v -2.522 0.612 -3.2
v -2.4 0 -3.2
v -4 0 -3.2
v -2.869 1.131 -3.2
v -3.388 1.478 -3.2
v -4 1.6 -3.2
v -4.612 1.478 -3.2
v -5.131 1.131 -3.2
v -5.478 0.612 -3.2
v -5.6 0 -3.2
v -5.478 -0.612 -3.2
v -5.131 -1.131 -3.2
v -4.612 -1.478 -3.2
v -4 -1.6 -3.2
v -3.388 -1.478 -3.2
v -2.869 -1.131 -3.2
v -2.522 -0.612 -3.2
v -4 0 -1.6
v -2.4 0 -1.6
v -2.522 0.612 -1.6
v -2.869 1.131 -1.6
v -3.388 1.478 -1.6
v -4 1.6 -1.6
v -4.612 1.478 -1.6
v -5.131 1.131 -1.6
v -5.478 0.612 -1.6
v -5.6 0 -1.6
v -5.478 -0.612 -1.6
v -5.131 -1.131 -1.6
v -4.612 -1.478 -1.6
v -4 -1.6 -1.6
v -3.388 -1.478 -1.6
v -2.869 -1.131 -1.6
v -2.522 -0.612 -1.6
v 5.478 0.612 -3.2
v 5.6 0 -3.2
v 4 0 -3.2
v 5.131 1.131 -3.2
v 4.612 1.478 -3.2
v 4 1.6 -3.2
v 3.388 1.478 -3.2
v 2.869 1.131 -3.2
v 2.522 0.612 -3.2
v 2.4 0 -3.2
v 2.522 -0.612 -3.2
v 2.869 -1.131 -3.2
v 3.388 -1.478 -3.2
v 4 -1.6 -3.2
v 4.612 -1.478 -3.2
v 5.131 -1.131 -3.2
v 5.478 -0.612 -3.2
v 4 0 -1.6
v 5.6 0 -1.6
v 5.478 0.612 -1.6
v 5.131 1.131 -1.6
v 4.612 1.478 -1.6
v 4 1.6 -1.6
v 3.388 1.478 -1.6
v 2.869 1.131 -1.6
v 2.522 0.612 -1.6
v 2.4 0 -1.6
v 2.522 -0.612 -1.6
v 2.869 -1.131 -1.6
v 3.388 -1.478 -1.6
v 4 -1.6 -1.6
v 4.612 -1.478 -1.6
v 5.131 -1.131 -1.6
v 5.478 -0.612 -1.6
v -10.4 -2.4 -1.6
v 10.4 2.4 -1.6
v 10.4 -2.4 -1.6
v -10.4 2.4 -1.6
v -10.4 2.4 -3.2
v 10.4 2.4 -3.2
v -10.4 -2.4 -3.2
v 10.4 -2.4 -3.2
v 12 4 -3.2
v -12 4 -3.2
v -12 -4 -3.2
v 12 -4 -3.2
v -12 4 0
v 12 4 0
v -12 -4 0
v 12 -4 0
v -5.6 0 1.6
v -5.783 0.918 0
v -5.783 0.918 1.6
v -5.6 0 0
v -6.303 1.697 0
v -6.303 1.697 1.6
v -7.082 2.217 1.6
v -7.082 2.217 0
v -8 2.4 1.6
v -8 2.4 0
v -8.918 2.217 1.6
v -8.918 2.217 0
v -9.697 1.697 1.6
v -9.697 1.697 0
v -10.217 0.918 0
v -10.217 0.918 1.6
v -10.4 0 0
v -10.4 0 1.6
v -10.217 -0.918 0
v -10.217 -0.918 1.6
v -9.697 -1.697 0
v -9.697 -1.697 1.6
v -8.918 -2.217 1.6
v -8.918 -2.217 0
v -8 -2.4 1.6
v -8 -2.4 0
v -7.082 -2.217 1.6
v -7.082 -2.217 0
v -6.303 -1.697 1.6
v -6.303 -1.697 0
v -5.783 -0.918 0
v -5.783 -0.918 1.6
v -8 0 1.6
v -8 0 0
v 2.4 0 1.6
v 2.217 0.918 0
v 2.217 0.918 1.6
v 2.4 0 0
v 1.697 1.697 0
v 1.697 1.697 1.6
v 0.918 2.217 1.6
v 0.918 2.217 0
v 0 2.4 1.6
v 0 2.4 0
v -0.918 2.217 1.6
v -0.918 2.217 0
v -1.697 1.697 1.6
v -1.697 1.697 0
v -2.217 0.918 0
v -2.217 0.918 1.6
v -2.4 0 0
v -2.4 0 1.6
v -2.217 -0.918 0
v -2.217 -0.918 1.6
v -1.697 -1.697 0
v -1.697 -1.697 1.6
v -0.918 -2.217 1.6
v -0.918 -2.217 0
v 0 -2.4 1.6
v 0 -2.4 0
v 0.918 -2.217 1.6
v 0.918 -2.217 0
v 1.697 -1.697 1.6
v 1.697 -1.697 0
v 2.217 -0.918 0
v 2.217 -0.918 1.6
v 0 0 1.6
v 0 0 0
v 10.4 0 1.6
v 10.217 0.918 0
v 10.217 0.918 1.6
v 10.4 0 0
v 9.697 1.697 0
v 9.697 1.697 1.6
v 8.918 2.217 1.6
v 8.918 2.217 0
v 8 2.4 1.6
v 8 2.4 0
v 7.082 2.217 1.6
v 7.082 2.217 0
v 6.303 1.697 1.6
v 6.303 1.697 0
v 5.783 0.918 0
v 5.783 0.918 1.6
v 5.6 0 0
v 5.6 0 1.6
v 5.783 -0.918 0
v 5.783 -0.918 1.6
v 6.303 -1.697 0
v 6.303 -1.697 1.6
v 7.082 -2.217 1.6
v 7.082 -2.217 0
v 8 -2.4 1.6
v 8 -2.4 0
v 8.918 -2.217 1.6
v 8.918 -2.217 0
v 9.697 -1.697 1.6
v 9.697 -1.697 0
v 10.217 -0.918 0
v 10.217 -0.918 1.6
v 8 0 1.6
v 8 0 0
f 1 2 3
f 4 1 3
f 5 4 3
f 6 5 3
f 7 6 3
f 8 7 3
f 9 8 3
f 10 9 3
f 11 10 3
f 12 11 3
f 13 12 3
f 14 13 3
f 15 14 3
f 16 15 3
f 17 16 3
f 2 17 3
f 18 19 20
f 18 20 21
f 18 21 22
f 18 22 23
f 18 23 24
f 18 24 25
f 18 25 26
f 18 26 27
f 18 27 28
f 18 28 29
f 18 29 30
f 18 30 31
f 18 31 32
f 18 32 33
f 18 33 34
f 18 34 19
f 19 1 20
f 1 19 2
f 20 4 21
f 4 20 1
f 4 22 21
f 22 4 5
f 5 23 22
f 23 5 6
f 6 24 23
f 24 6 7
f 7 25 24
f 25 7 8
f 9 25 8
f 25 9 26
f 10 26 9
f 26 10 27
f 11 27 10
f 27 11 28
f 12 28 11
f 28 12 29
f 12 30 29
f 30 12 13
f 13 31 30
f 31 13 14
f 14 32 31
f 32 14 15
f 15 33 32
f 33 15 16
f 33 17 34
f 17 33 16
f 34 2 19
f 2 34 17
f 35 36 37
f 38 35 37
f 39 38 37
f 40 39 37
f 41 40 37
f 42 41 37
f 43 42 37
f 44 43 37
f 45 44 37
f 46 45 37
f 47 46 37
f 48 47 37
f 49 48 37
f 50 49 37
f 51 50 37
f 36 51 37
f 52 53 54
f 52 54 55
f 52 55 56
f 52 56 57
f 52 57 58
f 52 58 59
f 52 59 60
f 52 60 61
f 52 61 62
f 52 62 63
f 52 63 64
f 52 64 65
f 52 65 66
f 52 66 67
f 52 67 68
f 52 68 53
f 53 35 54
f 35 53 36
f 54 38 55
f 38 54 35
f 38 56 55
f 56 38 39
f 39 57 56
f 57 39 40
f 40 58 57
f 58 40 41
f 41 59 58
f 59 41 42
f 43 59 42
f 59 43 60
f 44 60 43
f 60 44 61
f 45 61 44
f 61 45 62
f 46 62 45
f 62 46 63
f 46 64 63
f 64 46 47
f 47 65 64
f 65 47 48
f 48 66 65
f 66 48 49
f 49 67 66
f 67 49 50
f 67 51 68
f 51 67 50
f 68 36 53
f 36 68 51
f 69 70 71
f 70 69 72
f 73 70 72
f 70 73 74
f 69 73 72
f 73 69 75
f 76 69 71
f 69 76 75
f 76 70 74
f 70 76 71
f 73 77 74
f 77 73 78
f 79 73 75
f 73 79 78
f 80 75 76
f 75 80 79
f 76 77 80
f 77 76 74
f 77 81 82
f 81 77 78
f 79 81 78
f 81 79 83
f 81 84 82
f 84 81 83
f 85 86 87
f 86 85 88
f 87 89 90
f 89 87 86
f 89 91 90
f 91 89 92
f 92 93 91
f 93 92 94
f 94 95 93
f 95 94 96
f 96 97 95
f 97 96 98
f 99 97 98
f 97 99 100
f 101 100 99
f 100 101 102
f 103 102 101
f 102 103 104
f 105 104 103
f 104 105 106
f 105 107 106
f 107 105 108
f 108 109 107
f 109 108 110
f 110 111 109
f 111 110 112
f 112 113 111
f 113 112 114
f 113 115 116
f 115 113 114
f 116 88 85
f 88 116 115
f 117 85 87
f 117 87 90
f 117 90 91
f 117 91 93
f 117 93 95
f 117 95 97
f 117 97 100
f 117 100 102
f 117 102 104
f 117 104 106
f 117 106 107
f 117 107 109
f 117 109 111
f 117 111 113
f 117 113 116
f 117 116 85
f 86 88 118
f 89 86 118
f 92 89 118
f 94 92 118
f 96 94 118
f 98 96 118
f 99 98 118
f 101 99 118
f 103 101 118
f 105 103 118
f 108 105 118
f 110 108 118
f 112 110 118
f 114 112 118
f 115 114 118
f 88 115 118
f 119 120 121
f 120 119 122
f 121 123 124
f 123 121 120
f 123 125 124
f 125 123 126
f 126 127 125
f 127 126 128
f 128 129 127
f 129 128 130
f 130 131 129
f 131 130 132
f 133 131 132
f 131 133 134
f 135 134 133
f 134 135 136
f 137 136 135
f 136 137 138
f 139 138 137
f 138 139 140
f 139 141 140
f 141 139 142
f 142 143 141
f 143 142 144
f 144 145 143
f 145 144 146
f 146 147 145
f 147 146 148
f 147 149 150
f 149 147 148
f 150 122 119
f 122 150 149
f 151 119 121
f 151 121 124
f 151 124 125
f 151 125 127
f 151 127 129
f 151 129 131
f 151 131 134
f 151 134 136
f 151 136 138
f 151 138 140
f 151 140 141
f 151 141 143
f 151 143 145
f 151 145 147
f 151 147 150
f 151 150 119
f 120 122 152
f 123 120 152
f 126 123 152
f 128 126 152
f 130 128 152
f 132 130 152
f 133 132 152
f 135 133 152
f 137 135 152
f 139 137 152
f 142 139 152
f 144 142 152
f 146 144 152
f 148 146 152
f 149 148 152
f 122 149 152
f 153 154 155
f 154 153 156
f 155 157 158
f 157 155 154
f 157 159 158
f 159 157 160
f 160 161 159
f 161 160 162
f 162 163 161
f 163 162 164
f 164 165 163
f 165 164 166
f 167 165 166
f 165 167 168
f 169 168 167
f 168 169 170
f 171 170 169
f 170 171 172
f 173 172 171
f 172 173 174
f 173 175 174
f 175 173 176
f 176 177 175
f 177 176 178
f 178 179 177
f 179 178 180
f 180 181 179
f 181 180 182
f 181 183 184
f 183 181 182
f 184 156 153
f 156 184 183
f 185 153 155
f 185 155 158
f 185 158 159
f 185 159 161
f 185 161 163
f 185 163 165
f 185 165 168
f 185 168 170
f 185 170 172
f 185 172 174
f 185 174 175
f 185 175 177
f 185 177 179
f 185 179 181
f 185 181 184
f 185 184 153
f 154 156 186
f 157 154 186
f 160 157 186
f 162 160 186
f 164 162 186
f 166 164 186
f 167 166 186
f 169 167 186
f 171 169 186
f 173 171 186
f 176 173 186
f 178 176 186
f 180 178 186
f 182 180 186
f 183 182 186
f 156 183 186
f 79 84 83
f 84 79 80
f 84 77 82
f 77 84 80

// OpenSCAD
// file: ../p/4-4edge.scad
use <../lib.scad>
function ldraw_lib__4_4edge() = [
// 0 Circle 1.0
// 0 Name: 4-4edge.dat
// 0 Author: James Jessiman
// 0 !LDRAW_ORG Primitive UPDATE 2017-01
// 0 !LICENSE Licensed under CC BY 2.0 and CC BY 4.0 : see CAreadme.txt
// 
// 0 BFC CERTIFY CCW
  [0,"BFC","CERTIFY"],
  [0,"BFC","CCW"],
// 
// 0 !HISTORY 1998-12-15 [PTadmin] Official Update 1998-10
// 0 !HISTORY 2005-12-28 [PTadmin] Official Update 2005-01
// 0 !HISTORY 2007-06-24 [PTadmin] Header formatted for Contributor Agreement
// 0 !HISTORY 2008-07-01 [PTadmin] Official Update 2008-01
// 0 !HISTORY 2017-01-15 [Steffen] BFCed
// 0 !HISTORY 2017-12-30 [PTadmin] Official Update 2017-01
// 
// 
// 2 24 1 0 0 0.9239 0 0.3827
  [2,24,1,0,0,0.9239,0,0.3827],
// 2 24 0.9239 0 0.3827 0.7071 0 0.7071
  [2,24,0.9239,0,0.3827,0.7071,0,0.7071],
// 2 24 0.7071 0 0.7071 0.3827 0 0.9239
  [2,24,0.7071,0,0.7071,0.3827,0,0.9239],
// 2 24 0.3827 0 0.9239 0 0 1
  [2,24,0.3827,0,0.9239,0,0,1],
// 2 24 0 0 1 -0.3827 0 0.9239
  [2,24,0,0,1,-0.3827,0,0.9239],
// 2 24 -0.3827 0 0.9239 -0.7071 0 0.7071
  [2,24,-0.3827,0,0.9239,-0.7071,0,0.7071],
// 2 24 -0.7071 0 0.7071 -0.9239 0 0.3827
  [2,24,-0.7071,0,0.7071,-0.9239,0,0.3827],
// 2 24 -0.9239 0 0.3827 -1 0 -0
  [2,24,-0.9239,0,0.3827,-1,0,-0],
// 2 24 -1 0 -0 -0.9239 0 -0.3827
  [2,24,-1,0,-0,-0.9239,0,-0.3827],
// 2 24 -0.9239 0 -0.3827 -0.7071 0 -0.7071
  [2,24,-0.9239,0,-0.3827,-0.7071,0,-0.7071],
// 2 24 -0.7071 0 -0.7071 -0.3827 0 -0.9239
  [2,24,-0.7071,0,-0.7071,-0.3827,0,-0.9239],
// 2 24 -0.3827 0 -0.9239 0 0 -1
  [2,24,-0.3827,0,-0.9239,0,0,-1],
// 2 24 0 0 -1 0.3827 0 -0.9239
  [2,24,0,0,-1,0.3827,0,-0.9239],
// 2 24 0.3827 0 -0.9239 0.7071 0 -0.7071
  [2,24,0.3827,0,-0.9239,0.7071,0,-0.7071],
// 2 24 0.7071 0 -0.7071 0.9239 0 -0.3827
  [2,24,0.7071,0,-0.7071,0.9239,0,-0.3827],
// 2 24 0.9239 0 -0.3827 1 0 0
  [2,24,0.9239,0,-0.3827,1,0,0],
];
module ldraw_lib__4_4edge(step=0, col=false, unit=2/5, alt=false, line=0.2, solid=!$preview)
    makepoly(ldraw_lib__4_4edge(), step=step, col=col, unit=unit, alt=alt, line=line, solid=solid);
ldraw_lib__4_4edge(line=0.2);
// file: ../p/4-4disc.scad
use <../lib.scad>
function ldraw_lib__4_4disc() = [
// 0 Disc 1.0
// 0 Name: 4-4disc.dat
// 0 Author: James Jessiman
// 0 !LDRAW_ORG Primitive UPDATE 2002-02
// 0 !LICENSE Licensed under CC BY 2.0 and CC BY 4.0 : see CAreadme.txt
// 
// 0 BFC CERTIFY CCW
  [0,"BFC","CERTIFY"],
  [0,"BFC","CCW"],
// 
// 0 !HISTORY 1998-12-15 [PTadmin] Official Update 1998-10
// 0 !HISTORY 2002-03-23 [sbliss] Added BFC statement
// 0 !HISTORY 2002-04-25 [PTadmin] Official Update 2002-02
// 0 !HISTORY 2007-06-24 [PTadmin] Header formatted for Contributor Agreement
// 0 !HISTORY 2008-07-01 [PTadmin] Official Update 2008-01
// 
// 
// 3 16 0 0 0 1 0 0 0.9239 0 0.3827
  [3,16,0,0,0,1,0,0,0.9239,0,0.3827],
// 3 16 0 0 0 0.9239 0 0.3827 0.7071 0 0.7071
  [3,16,0,0,0,0.9239,0,0.3827,0.7071,0,0.7071],
// 3 16 0 0 0 0.7071 0 0.7071 0.3827 0 0.9239
  [3,16,0,0,0,0.7071,0,0.7071,0.3827,0,0.9239],
// 3 16 0 0 0 0.3827 0 0.9239 0 0 1
  [3,16,0,0,0,0.3827,0,0.9239,0,0,1],
// 3 16 0 0 0 0 0 1 -0.3827 0 0.9239
  [3,16,0,0,0,0,0,1,-0.3827,0,0.9239],
// 3 16 0 0 0 -0.3827 0 0.9239 -0.7071 0 0.7071
  [3,16,0,0,0,-0.3827,0,0.9239,-0.7071,0,0.7071],
// 3 16 0 0 0 -0.7071 0 0.7071 -0.9239 0 0.3827
  [3,16,0,0,0,-0.7071,0,0.7071,-0.9239,0,0.3827],
// 3 16 0 0 0 -0.9239 0 0.3827 -1 0 -0
  [3,16,0,0,0,-0.9239,0,0.3827,-1,0,-0],
// 3 16 0 0 0 -1 0 -0 -0.9239 0 -0.3827
  [3,16,0,0,0,-1,0,-0,-0.9239,0,-0.3827],
// 3 16 0 0 0 -0.9239 0 -0.3827 -0.7071 0 -0.7071
  [3,16,0,0,0,-0.9239,0,-0.3827,-0.7071,0,-0.7071],
// 3 16 0 0 0 -0.7071 0 -0.7071 -0.3827 0 -0.9239
  [3,16,0,0,0,-0.7071,0,-0.7071,-0.3827,0,-0.9239],
// 3 16 0 0 0 -0.3827 0 -0.9239 0 0 -1
  [3,16,0,0,0,-0.3827,0,-0.9239,0,0,-1],
// 3 16 0 0 0 0 0 -1 0.3827 0 -0.9239
  [3,16,0,0,0,0,0,-1,0.3827,0,-0.9239],
// 3 16 0 0 0 0.3827 0 -0.9239 0.7071 0 -0.7071
  [3,16,0,0,0,0.3827,0,-0.9239,0.7071,0,-0.7071],
// 3 16 0 0 0 0.7071 0 -0.7071 0.9239 0 -0.3827
  [3,16,0,0,0,0.7071,0,-0.7071,0.9239,0,-0.3827],
// 3 16 0 0 0 0.9239 0 -0.3827 1 0 0
  [3,16,0,0,0,0.9239,0,-0.3827,1,0,0],
// 0
];
module ldraw_lib__4_4disc(step=0, col=false, unit=2/5, alt=false, line=0.2, solid=!$preview)
    makepoly(ldraw_lib__4_4disc(), step=step, col=col, unit=unit, alt=alt, line=line, solid=solid);
ldraw_lib__4_4disc(line=0.2);
// file: ../p/4-4cyli.scad
use <../lib.scad>
$fa=1; $fs=0.2;
function ldraw_lib__4_4cyli(realsolid=false) = [
// 0 Cylinder 1.0
// 0 Name: 4-4cyli.dat
// 0 Author: James Jessiman
// 0 !LDRAW_ORG Primitive UPDATE 2005-01
// 0 !LICENSE Licensed under CC BY 2.0 and CC BY 4.0 : see CAreadme.txt
// 
// 0 BFC CERTIFY CCW
  [0,"BFC","CERTIFY"],
  [0,"BFC","CCW"],
// 
// 0 !HISTORY 1998-12-15 [PTadmin] Official Update 1998-10
// 0 !HISTORY 2002-03-23 [sbliss] Added BFC statement; merged headers from files in distributions LDraw 0.27 and Complete.
// 0 !HISTORY 2002-04-25 [PTadmin] Official Update 2002-02
// 0 !HISTORY 2004-12-14 [guyvivan] BFC CCW
// 0 !HISTORY 2005-12-28 [PTadmin] Official Update 2005-01
// 0 !HISTORY 2007-06-24 [PTadmin] Header formatted for Contributor Agreement
// 0 !HISTORY 2008-07-01 [PTadmin] Official Update 2008-01
// 
// 
// 4 16 1 1 0 0.9239 1 0.3827 0.9239 0 0.3827 1 0 0
  [4,16,1,1,0,0.9239,1,0.3827,0.9239,0,0.3827,1,0,0],
// 5 24 1 0 0 1 1 0 0.9239 0 0.3827 0.9239 0 -0.3827
  [5,24,1,0,0,1,1,0,0.9239,0,0.3827,0.9239,0,-0.3827],
// 4 16 0.9239 1 0.3827 0.7071 1 0.7071 0.7071 0 0.7071 0.9239 0 0.3827
  [4,16,0.9239,1,0.3827,0.7071,1,0.7071,0.7071,0,0.7071,0.9239,0,0.3827],
// 5 24 0.9239 0 0.3827 0.9239 1 0.3827 0.7071 0 0.7071 1 0 0
  [5,24,0.9239,0,0.3827,0.9239,1,0.3827,0.7071,0,0.7071,1,0,0],
// 4 16 0.7071 1 0.7071 0.3827 1 0.9239 0.3827 0 0.9239 0.7071 0 0.7071
  [4,16,0.7071,1,0.7071,0.3827,1,0.9239,0.3827,0,0.9239,0.7071,0,0.7071],
// 5 24 0.7071 0 0.7071 0.7071 1 0.7071 0.3827 0 0.9239 0.9239 0 0.3827
  [5,24,0.7071,0,0.7071,0.7071,1,0.7071,0.3827,0,0.9239,0.9239,0,0.3827],
// 4 16 0.3827 1 0.9239 0 1 1 0 0 1 0.3827 0 0.9239
  [4,16,0.3827,1,0.9239,0,1,1,0,0,1,0.3827,0,0.9239],
// 5 24 0.3827 0 0.9239 0.3827 1 0.9239 0 0 1 0.7071 0 0.7071
  [5,24,0.3827,0,0.9239,0.3827,1,0.9239,0,0,1,0.7071,0,0.7071],
// 4 16 0 1 1 -0.3827 1 0.9239 -0.3827 0 0.9239 0 0 1
  [4,16,0,1,1,-0.3827,1,0.9239,-0.3827,0,0.9239,0,0,1],
// 5 24 0 0 1 0 1 1 -0.3827 0 0.9239 0.3827 0 0.9239
  [5,24,0,0,1,0,1,1,-0.3827,0,0.9239,0.3827,0,0.9239],
// 4 16 -0.3827 1 0.9239 -0.7071 1 0.7071 -0.7071 0 0.7071 -0.3827 0 0.9239
  [4,16,-0.3827,1,0.9239,-0.7071,1,0.7071,-0.7071,0,0.7071,-0.3827,0,0.9239],
// 5 24 -0.3827 0 0.9239 -0.3827 1 0.9239 -0.7071 0 0.7071 0 0 1
  [5,24,-0.3827,0,0.9239,-0.3827,1,0.9239,-0.7071,0,0.7071,0,0,1],
// 4 16 -0.7071 1 0.7071 -0.9239 1 0.3827 -0.9239 0 0.3827 -0.7071 0 0.7071
  [4,16,-0.7071,1,0.7071,-0.9239,1,0.3827,-0.9239,0,0.3827,-0.7071,0,0.7071],
// 5 24 -0.7071 0 0.7071 -0.7071 1 0.7071 -0.9239 0 0.3827 -0.3827 0 0.9239
  [5,24,-0.7071,0,0.7071,-0.7071,1,0.7071,-0.9239,0,0.3827,-0.3827,0,0.9239],
// 4 16 -0.9239 1 0.3827 -1 1 0 -1 0 0 -0.9239 0 0.3827
  [4,16,-0.9239,1,0.3827,-1,1,0,-1,0,0,-0.9239,0,0.3827],
// 5 24 -0.9239 0 0.3827 -0.9239 1 0.3827 -1 0 0 -0.7071 0 0.7071
  [5,24,-0.9239,0,0.3827,-0.9239,1,0.3827,-1,0,0,-0.7071,0,0.7071],
// 4 16 -1 1 0 -0.9239 1 -0.3827 -0.9239 0 -0.3827 -1 0 0
  [4,16,-1,1,0,-0.9239,1,-0.3827,-0.9239,0,-0.3827,-1,0,0],
// 5 24 -1 0 0 -1 1 0 -0.9239 0 -0.3827 -0.9239 0 0.3827
  [5,24,-1,0,0,-1,1,0,-0.9239,0,-0.3827,-0.9239,0,0.3827],
// 4 16 -0.9239 1 -0.3827 -0.7071 1 -0.7071 -0.7071 0 -0.7071 -0.9239 0 -0.3827
  [4,16,-0.9239,1,-0.3827,-0.7071,1,-0.7071,-0.7071,0,-0.7071,-0.9239,0,-0.3827],
// 5 24 -0.9239 0 -0.3827 -0.9239 1 -0.3827 -0.7071 0 -0.7071 -1 0 0
  [5,24,-0.9239,0,-0.3827,-0.9239,1,-0.3827,-0.7071,0,-0.7071,-1,0,0],
// 4 16 -0.7071 1 -0.7071 -0.3827 1 -0.9239 -0.3827 0 -0.9239 -0.7071 0 -0.7071
  [4,16,-0.7071,1,-0.7071,-0.3827,1,-0.9239,-0.3827,0,-0.9239,-0.7071,0,-0.7071],
// 5 24 -0.7071 0 -0.7071 -0.7071 1 -0.7071 -0.3827 0 -0.9239 -0.9239 0 -0.3827
  [5,24,-0.7071,0,-0.7071,-0.7071,1,-0.7071,-0.3827,0,-0.9239,-0.9239,0,-0.3827],
// 4 16 -0.3827 1 -0.9239 0 1 -1 0 0 -1 -0.3827 0 -0.9239
  [4,16,-0.3827,1,-0.9239,0,1,-1,0,0,-1,-0.3827,0,-0.9239],
// 5 24 -0.3827 0 -0.9239 -0.3827 1 -0.9239 0 0 -1 -0.7071 0 -0.7071
  [5,24,-0.3827,0,-0.9239,-0.3827,1,-0.9239,0,0,-1,-0.7071,0,-0.7071],
// 4 16 0 1 -1 0.3827 1 -0.9239 0.3827 0 -0.9239 0 0 -1
  [4,16,0,1,-1,0.3827,1,-0.9239,0.3827,0,-0.9239,0,0,-1],
// 5 24 0 0 -1 0 1 -1 0.3827 0 -0.9239 -0.3827 0 -0.9239
  [5,24,0,0,-1,0,1,-1,0.3827,0,-0.9239,-0.3827,0,-0.9239],
// 4 16 0.3827 1 -0.9239 0.7071 1 -0.7071 0.7071 0 -0.7071 0.3827 0 -0.9239
  [4,16,0.3827,1,-0.9239,0.7071,1,-0.7071,0.7071,0,-0.7071,0.3827,0,-0.9239],
// 5 24 0.3827 0 -0.9239 0.3827 1 -0.9239 0.7071 0 -0.7071 0 0 -1
  [5,24,0.3827,0,-0.9239,0.3827,1,-0.9239,0.7071,0,-0.7071,0,0,-1],
// 4 16 0.7071 1 -0.7071 0.9239 1 -0.3827 0.9239 0 -0.3827 0.7071 0 -0.7071
  [4,16,0.7071,1,-0.7071,0.9239,1,-0.3827,0.9239,0,-0.3827,0.7071,0,-0.7071],
// 5 24 0.7071 0 -0.7071 0.7071 1 -0.7071 0.9239 0 -0.3827 0.3827 0 -0.9239
  [5,24,0.7071,0,-0.7071,0.7071,1,-0.7071,0.9239,0,-0.3827,0.3827,0,-0.9239],
// 4 16 0.9239 1 -0.3827 1 1 0 1 0 0 0.9239 0 -0.3827
  [4,16,0.9239,1,-0.3827,1,1,0,1,0,0,0.9239,0,-0.3827],
// 5 24 0.9239 0 -0.3827 0.9239 1 -0.3827 1 0 0 0.7071 0 -0.7071
  [5,24,0.9239,0,-0.3827,0.9239,1,-0.3827,1,0,0,0.7071,0,-0.7071],
// 0
];
module ldraw_lib__4_4cyli(step=0, col=false, unit=2/5, alt=false, line=0.2, solid=!$preview)
    makepoly(ldraw_lib__4_4cyli(solid), step=step, col=col, unit=unit, alt=alt, line=line, solid=solid);
ldraw_lib__4_4cyli(line=0.2);
// file: ../p/stud3.scad
use <../lib.scad>
use <4-4cyli.scad>
use <4-4disc.scad>
use <4-4edge.scad>
function ldraw_lib__stud3() = [
// 0 Stud Tube Solid
// 0 Name: stud3.dat
// 0 Author: James Jessiman
// 0 !LDRAW_ORG Primitive UPDATE 2012-01
// 0 !LICENSE Licensed under CC BY 4.0 : see CAreadme.txt
// 
// 0 BFC CERTIFY CCW
  [0,"BFC","CERTIFY"],
  [0,"BFC","CCW"],
// 
// 0 !HISTORY 2002-04-04 [sbliss] Modified for BFC compliance
// 0 !HISTORY 2002-04-25 [PTadmin] Official Update 2002-02
// 0 !HISTORY 2007-06-24 [PTadmin] Header formatted for Contributor Agreement
// 0 !HISTORY 2008-07-01 [PTadmin] Official Update 2008-01
// 0 !HISTORY 2012-02-16 [Philo] Changed to CCW
// 0 !HISTORY 2012-03-30 [PTadmin] Official Update 2012-01
// 
// 
// 1 16 0 -4 0 4 0 0 0 1 0 0 0 4 4-4edge.dat
  [1,16,0,-4,0,4,0,0,0,1,0,0,0,4, ldraw_lib__4_4edge()],
// 1 16 0 0 0 4 0 0 0 1 0 0 0 4 4-4edge.dat
  [1,16,0,0,0,4,0,0,0,1,0,0,0,4, ldraw_lib__4_4edge()],
// 1 16 0 -4 0 4 0 0 0 1 0 0 0 4 4-4disc.dat
  [1,16,0,-4,0,4,0,0,0,1,0,0,0,4, ldraw_lib__4_4disc()],
  [-1,16,0,0,0,4,0,0,0,-1,0,0,0,4, ldraw_lib__4_4disc()],
// 1 16 0 -4 0 4 0 0 0 4 0 0 0 4 4-4cyli.dat
  [1,16,0,-4,0,4,0,0,0,4,0,0,0,4, ldraw_lib__4_4cyli()],
];
module ldraw_lib__stud3(step=0, col=false, unit=2/5, alt=false, line=0.2, solid=!$preview)
    makepoly(ldraw_lib__stud3(), step=step, col=col, unit=unit, alt=alt, line=line, solid=solid);
ldraw_lib__stud3(line=0.2);
// file: ../p/stud.scad
use <../lib.scad>
use <4-4cyli.scad>
use <4-4disc.scad>
use <4-4edge.scad>
function ldraw_lib__stud() = [
// 0 Stud
// 0 Name: stud.dat
// 0 Author: James Jessiman
// 0 !LDRAW_ORG Primitive UPDATE 2012-01
// 0 !LICENSE Licensed under CC BY 4.0 : see CAreadme.txt
// 
// 0 BFC CERTIFY CCW
  [0,"BFC","CERTIFY"],
  [0,"BFC","CCW"],
// 
// 0 !HISTORY 2002-04-04 [sbliss] Modified for BFC compliance
// 0 !HISTORY 2002-04-25 [PTadmin] Official Update 2002-02
// 0 !HISTORY 2007-06-24 [PTadmin] Header formatted for Contributor Agreement
// 0 !HISTORY 2008-07-01 [PTadmin] Official Update 2008-01
// 0 !HISTORY 2012-02-16 [Philo] Changed to CCW
// 0 !HISTORY 2012-03-30 [PTadmin] Official Update 2012-01
// 
// 
// 1 16 0 0 0 6 0 0 0 1 0 0 0 6 4-4edge.dat
  [1,16,0,0,0,6,0,0,0,1,0,0,0,6, ldraw_lib__4_4edge()],
// 1 16 0 -4 0 6 0 0 0 1 0 0 0 6 4-4edge.dat
  [1,16,0,-4,0,6,0,0,0,1,0,0,0,6, ldraw_lib__4_4edge()],
// 1 16 0 0 0 6 0 0 0 -4 0 0 0 6 4-4cyli.dat
  [1,16,0,0,0,6,0,0,0,-4,0,0,0,6, ldraw_lib__4_4cyli()],
// 1 16 0 -4 0 6 0 0 0 1 0 0 0 6 4-4disc.dat
  [1,16,0,-4,0,6,0,0,0,1,0,0,0,6, ldraw_lib__4_4disc()],
  [-1,16,0,0,0,6,0,0,0,-1,0,0,0,6, ldraw_lib__4_4disc()],
];
module ldraw_lib__stud(step=0, col=false, unit=2/5, alt=false, line=0.2, solid=!$preview)
    makepoly(ldraw_lib__stud(), step=step, col=col, unit=unit, alt=alt, line=line, solid=solid);
ldraw_lib__stud(line=0.2);
// file: ../p/stug3-1x2.scad
use <../lib.scad>
use <stud3.scad>
function ldraw_lib__stug3_1x2() = [
// 0 Stud Tube Solid Group  1 x  2
// 0 Name: stug3-1x2.dat
// 0 Author: Steffen [Steffen]
// 0 !LDRAW_ORG Primitive UPDATE 2013-02
// 0 !LICENSE Licensed under CC BY 4.0 : see CAreadme.txt
// 
// 0 BFC CERTIFY CCW
  [0,"BFC","CERTIFY"],
  [0,"BFC","CCW"],
// 
// 0 !HISTORY 2013-12-23 [PTadmin] Official Update 2013-02
// 
// 
// 1 16 -10 0 0 1 0 0 0 1 0 0 0 1 stud3.dat
  [1,16,-10,0,0,1,0,0,0,1,0,0,0,1, ldraw_lib__stud3()],
// 1 16 10 0 0 1 0 0 0 1 0 0 0 1 stud3.dat
  [1,16,10,0,0,1,0,0,0,1,0,0,0,1, ldraw_lib__stud3()],
];
module ldraw_lib__stug3_1x2(step=0, col=false, unit=2/5, alt=false, line=0.2, solid=!$preview)
    makepoly(ldraw_lib__stug3_1x2(), step=step, col=col, unit=unit, alt=alt, line=line, solid=solid);
ldraw_lib__stug3_1x2(line=0.2);
// file: ../p/stug-1x3.scad
use <../lib.scad>
use <stud.scad>
$fa=1; $fs=0.2;
function ldraw_lib__stug_1x3(realsolid=false) = [
// 0 Stud Group  1 x  3
// 0 Name: stug-1x3.dat
// 0 Author: Steffen [Steffen]
// 0 !LDRAW_ORG Primitive UPDATE 2012-01
// 0 !LICENSE Licensed under CC BY 2.0 and CC BY 4.0 : see CAreadme.txt
// 
// 0 BFC CERTIFY CCW
  [0,"BFC","CERTIFY"],
  [0,"BFC","CCW"],
// 
// 0 !HISTORY 2012-03-30 [PTadmin] Official Update 2012-01
// 
// 
// 1 16 -20 0 0 1 0 0 0 1 0 0 0 1 stud.dat
  [1,16,-20,0,0,1,0,0,0,1,0,0,0,1, ldraw_lib__stud(realsolid)],
// 1 16 0 0 0 1 0 0 0 1 0 0 0 1 stud.dat
  [1,16,0,0,0,1,0,0,0,1,0,0,0,1, ldraw_lib__stud(realsolid)],
// 1 16 20 0 0 1 0 0 0 1 0 0 0 1 stud.dat
  [1,16,20,0,0,1,0,0,0,1,0,0,0,1, ldraw_lib__stud(realsolid)],
];
module ldraw_lib__stug_1x3(step=0, col=false, unit=2/5, alt=false, line=0.2, solid=!$preview)
    makepoly(ldraw_lib__stug_1x3(solid), step=step, col=col, unit=unit, alt=alt, line=line, solid=solid);
ldraw_lib__stug_1x3(line=0.2);
// file: ../p/recte4.scad
use <../lib.scad>
function ldraw_lib__recte4() = [
// 0 Rectangle Empty with 4 Edges
// 0 Name: recte4.dat
// 0 Author: Steffen [Steffen]
// 0 !LDRAW_ORG Primitive UPDATE 2010-03
// 0 !LICENSE Licensed under CC BY 4.0 : see CAreadme.txt
// 
// 0 BFC CERTIFY CCW
  [0,"BFC","CERTIFY"],
  [0,"BFC","CCW"],
// 
// 0 !HISTORY 2010-12-31 [PTadmin] Official Update 2010-03
// 
// 
// 2 24 1 0 1 -1 0 1
  [2,24,1,0,1,-1,0,1],
// 2 24 -1 0 1 -1 0 -1
  [2,24,-1,0,1,-1,0,-1],
// 2 24 -1 0 -1 1 0 -1
  [2,24,-1,0,-1,1,0,-1],
// 2 24 1 0 -1 1 0 1
  [2,24,1,0,-1,1,0,1],
];
module ldraw_lib__recte4(step=0, col=false, unit=2/5, alt=false, line=0.2, solid=!$preview)
    makepoly(ldraw_lib__recte4(), step=step, col=col, unit=unit, alt=alt, line=line, solid=solid);
ldraw_lib__recte4(line=0.2);
// file: ../p/box5.scad
use <../lib.scad>
function ldraw_lib__box5() = [
// 0 Box with 5 Faces and All Edges
// 0 Name: box5.dat
// 0 Author: James Jessiman
// 0 !LDRAW_ORG Primitive UPDATE 2012-01
// 0 !LICENSE Licensed under CC BY 2.0 and CC BY 4.0 : see CAreadme.txt
// 
// 0 BFC CERTIFY CCW
  [0,"BFC","CERTIFY"],
  [0,"BFC","CCW"],
// 
// 0 !HISTORY 2002-04-03 [sbliss] Modified for BFC compliance
// 0 !HISTORY 2002-04-25 [PTadmin] Official Update 2002-02
// 0 !HISTORY 2007-06-24 [PTadmin] Header formatted for Contributor Agreement
// 0 !HISTORY 2008-07-01 [PTadmin] Official Update 2008-01
// 0 !HISTORY 2012-02-16 [Philo] Changed to CCW
// 0 !HISTORY 2012-03-30 [PTadmin] Official Update 2012-01
// 
// 
// 2 24 1 1 1 -1 1 1
  [2,24,1,1,1,-1,1,1],
// 2 24 -1 1 1 -1 1 -1
  [2,24,-1,1,1,-1,1,-1],
// 2 24 -1 1 -1 1 1 -1
  [2,24,-1,1,-1,1,1,-1],
// 2 24 1 1 -1 1 1 1
  [2,24,1,1,-1,1,1,1],
// 2 24 1 0 1 -1 0 1
  [2,24,1,0,1,-1,0,1],
// 2 24 -1 0 1 -1 0 -1
  [2,24,-1,0,1,-1,0,-1],
// 2 24 -1 0 -1 1 0 -1
  [2,24,-1,0,-1,1,0,-1],
// 2 24 1 0 -1 1 0 1
  [2,24,1,0,-1,1,0,1],
// 2 24 1 0 1 1 1 1
  [2,24,1,0,1,1,1,1],
// 2 24 -1 0 1 -1 1 1
  [2,24,-1,0,1,-1,1,1],
// 2 24 1 0 -1 1 1 -1
  [2,24,1,0,-1,1,1,-1],
// 2 24 -1 0 -1 -1 1 -1
  [2,24,-1,0,-1,-1,1,-1],
// 4 16 -1 1 1 1 1 1 1 1 -1 -1 1 -1
  [4,16,-1,1,1,1,1,1,1,1,-1,-1,1,-1],
// 4 16 -1 1 1 -1 0 1 1 0 1 1 1 1
  [4,16,-1,1,1,-1,0,1,1,0,1,1,1,1],
// 4 16 -1 1 -1 -1 0 -1 -1 0 1 -1 1 1
  [4,16,-1,1,-1,-1,0,-1,-1,0,1,-1,1,1],
// 4 16 1 1 -1 1 0 -1 -1 0 -1 -1 1 -1
  [4,16,1,1,-1,1,0,-1,-1,0,-1,-1,1,-1],
// 4 16 1 1 1 1 0 1 1 0 -1 1 1 -1
  [4,16,1,1,1,1,0,1,1,0,-1,1,1,-1],
];
makepoly(ldraw_lib__box5(), line=0.2);
// file: ../p/box3-5a.scad
use <../lib.scad>
$fa=1; $fs=0.2;
function ldraw_lib__box3_5a(realsolid=false) = [
// 0 Box with 3 Adjacent Faces without 5 Adjacent Edges
// 0 Name: box3-5a.dat
// 0 Author: Philippe Hurbain [Philo]
// 0 !LDRAW_ORG Primitive UPDATE 2013-02
// 0 !LICENSE Licensed under CC BY 2.0 and CC BY 4.0 : see CAreadme.txt
// 
// 0 BFC CERTIFY CCW
  [0,"BFC","CERTIFY"],
  [0,"BFC","CCW"],
// 
// 0 !HISTORY 2013-12-23 [PTadmin] Official Update 2013-02
// 
// 
// 2 24 1 1 1 -1 1 1
  [2,24,1,1,1,-1,1,1],
// 2 24 -1 1 1 -1 1 -1
  [2,24,-1,1,1,-1,1,-1],
// 2 24 1 1 -1 1 1 1
  [2,24,1,1,-1,1,1,1],
// 2 24 1 -1 1 -1 -1 1
  [2,24,1,-1,1,-1,-1,1],
// 2 24 1 -1 -1 1 -1 1
  [2,24,1,-1,-1,1,-1,1],
// 2 24 1 -1 1 1 1 1
  [2,24,1,-1,1,1,1,1],
// 2 24 -1 -1 1 -1 1 1
  [2,24,-1,-1,1,-1,1,1],
// 
// 4 16 1 1 1 1 1 -1 -1 1 -1 -1 1 1
  [4,16,1,1,1,1,1,-1,-1,1,-1,-1,1,1],
// 4 16 1 1 1 1 -1 1 1 -1 -1 1 1 -1
  [4,16,1,1,1,1,-1,1,1,-1,-1,1,1,-1],
// 4 16 1 1 1 -1 1 1 -1 -1 1 1 -1 1
  [4,16,1,1,1,-1,1,1,-1,-1,1,1,-1,1],
];
module ldraw_lib__box3_5a(step=0, col=false, unit=2/5, alt=false, line=0.2, solid=!$preview)
    makepoly(ldraw_lib__box3_5a(solid), step=step, col=col, unit=unit, alt=alt, line=line, solid=solid);
ldraw_lib__box3_5a(line=0.2);
// file: s/3623s02.scad
use <../../lib.scad>
use <../../p/box3-5a.scad>
use <../../p/box5.scad>
use <../../p/recte4.scad>
use <../../p/stug-1x3.scad>
use <../../p/stug3-1x2.scad>
function ldraw_lib__s__3623s02() = [
// 0 ~Plate  1 x  3 without Front  and Side Face
// 0 Name: s\3623s02.dat
// 0 Author: Magnus Forsberg [MagFors]
// 0 !LDRAW_ORG Subpart UPDATE 2024-06
// 0 !LICENSE Licensed under CC BY 4.0 : see CAreadme.txt
// 
// 0 BFC CERTIFY CCW
  [0,"BFC","CERTIFY"],
  [0,"BFC","CCW"],
// 
// 0 !HISTORY 2024-07-29 [OrionP] Official Update 2024-06
// 
// 
// 1 16 0 4 0 1 0 0 0 -1 0 0 0 1 stug3-1x2.dat
  [1,16,0,4,0,1,0,0,0,-1,0,0,0,1, ldraw_lib__stug3_1x2()],
// 0 BFC INVERTNEXT
  [0,"BFC","INVERTNEXT"],
// 1 16 0 8 0 26 0 0 0 -4 0 0 0 6 box5.dat
  [1,16,0,8,0,26,0,0,0,-4,0,0,0,6, ldraw_lib__box5()],
// 4 16 30 8 10 26 8 6 -26 8 6 -30 8 10
  [4,16,30,8,10,26,8,6,-26,8,6,-30,8,10],
// 4 16 -30 8 10 -26 8 6 -26 8 -6 -30 8 -10
  [4,16,-30,8,10,-26,8,6,-26,8,-6,-30,8,-10],
// 4 16 -30 8 -10 -26 8 -6 26 8 -6 30 8 -10
  [4,16,-30,8,-10,-26,8,-6,26,8,-6,30,8,-10],
// 4 16 30 8 -10 26 8 -6 26 8 6 30 8 10
  [4,16,30,8,-10,26,8,-6,26,8,6,30,8,10],
// 1 16 0 8 0 30 0 0 0 1 0 0 0 10 recte4.dat
  [1,16,0,8,0,30,0,0,0,1,0,0,0,10, ldraw_lib__recte4()],
// 2 24 30 0 -10 30 8 -10
  [2,24,30,0,-10,30,8,-10],
// 1 16 0 4 0 -30 0 0 0 0 -4 0 10 0 box3-5a.dat
  [1,16,0,4,0,-30,0,0,0,0,-4,0,10,0, ldraw_lib__box3_5a()],
// 1 16 0 0 0 1 0 0 0 1 0 0 0 1 stug-1x3.dat
  [1,16,0,0,0,1,0,0,0,1,0,0,0,1, ldraw_lib__stug_1x3()],
];
module ldraw_lib__s__3623s02(step=0, col=false, unit=2/5, alt=false, line=0.2, solid=!$preview)
    makepoly(ldraw_lib__s__3623s02(), step=step, col=col, unit=unit, alt=alt, line=line, solid=solid);
ldraw_lib__s__3623s02(line=0.2);
// main file
use <../lib.scad>
use <s/3623s02.scad>
function ldraw_lib__3623pb0() = [
// 0 Plate  1 x  3 with Metallic Gold Front Face Pattern
// 0 Name: 3623pb0.dat
// 0 Author: Magnus Forsberg [MagFors]
// 0 !LDRAW_ORG Part UPDATE 2024-06
// 0 !LICENSE Licensed under CC BY 4.0 : see CAreadme.txt
// 
// 0 BFC CERTIFY CCW
  [0,"BFC","CERTIFY"],
  [0,"BFC","CCW"],
// 
// 0 !KEYWORDS Bricklink 3623pb022, Iron Man, Marvel, Rebrickable 3623pr0030
// 0 !KEYWORDS Set 76165, Superheroes
// 
// 0 !HISTORY 2024-07-29 [OrionP] Official Update 2024-06
// 
// 
// 1 16 0 0 0 1 0 0 0 1 0 0 0 1 s\3623s02.dat
  [1,16,0,0,0,1,0,0,0,1,0,0,0,1, ldraw_lib__s__3623s02()],
// 4 82 30 0 -10 -30 0 -10 -30 8 -10 30 8 -10
  [4,82,30,0,-10,-30,0,-10,-30,8,-10,30,8,-10],
// 4 16 30 0 -10 30 8 -10 30 8 10 30 0 10
  [4,16,30,0,-10,30,8,-10,30,8,10,30,0,10],
];
module ldraw_lib__3623pb0(step=0, col=false, unit=2/5, alt=false, line=0.2, solid=!$preview)
    makepoly(ldraw_lib__3623pb0(), step=step, col=col, unit=unit, alt=alt, line=line, solid=solid);
ldraw_lib__3623pb0(line=0.2);
